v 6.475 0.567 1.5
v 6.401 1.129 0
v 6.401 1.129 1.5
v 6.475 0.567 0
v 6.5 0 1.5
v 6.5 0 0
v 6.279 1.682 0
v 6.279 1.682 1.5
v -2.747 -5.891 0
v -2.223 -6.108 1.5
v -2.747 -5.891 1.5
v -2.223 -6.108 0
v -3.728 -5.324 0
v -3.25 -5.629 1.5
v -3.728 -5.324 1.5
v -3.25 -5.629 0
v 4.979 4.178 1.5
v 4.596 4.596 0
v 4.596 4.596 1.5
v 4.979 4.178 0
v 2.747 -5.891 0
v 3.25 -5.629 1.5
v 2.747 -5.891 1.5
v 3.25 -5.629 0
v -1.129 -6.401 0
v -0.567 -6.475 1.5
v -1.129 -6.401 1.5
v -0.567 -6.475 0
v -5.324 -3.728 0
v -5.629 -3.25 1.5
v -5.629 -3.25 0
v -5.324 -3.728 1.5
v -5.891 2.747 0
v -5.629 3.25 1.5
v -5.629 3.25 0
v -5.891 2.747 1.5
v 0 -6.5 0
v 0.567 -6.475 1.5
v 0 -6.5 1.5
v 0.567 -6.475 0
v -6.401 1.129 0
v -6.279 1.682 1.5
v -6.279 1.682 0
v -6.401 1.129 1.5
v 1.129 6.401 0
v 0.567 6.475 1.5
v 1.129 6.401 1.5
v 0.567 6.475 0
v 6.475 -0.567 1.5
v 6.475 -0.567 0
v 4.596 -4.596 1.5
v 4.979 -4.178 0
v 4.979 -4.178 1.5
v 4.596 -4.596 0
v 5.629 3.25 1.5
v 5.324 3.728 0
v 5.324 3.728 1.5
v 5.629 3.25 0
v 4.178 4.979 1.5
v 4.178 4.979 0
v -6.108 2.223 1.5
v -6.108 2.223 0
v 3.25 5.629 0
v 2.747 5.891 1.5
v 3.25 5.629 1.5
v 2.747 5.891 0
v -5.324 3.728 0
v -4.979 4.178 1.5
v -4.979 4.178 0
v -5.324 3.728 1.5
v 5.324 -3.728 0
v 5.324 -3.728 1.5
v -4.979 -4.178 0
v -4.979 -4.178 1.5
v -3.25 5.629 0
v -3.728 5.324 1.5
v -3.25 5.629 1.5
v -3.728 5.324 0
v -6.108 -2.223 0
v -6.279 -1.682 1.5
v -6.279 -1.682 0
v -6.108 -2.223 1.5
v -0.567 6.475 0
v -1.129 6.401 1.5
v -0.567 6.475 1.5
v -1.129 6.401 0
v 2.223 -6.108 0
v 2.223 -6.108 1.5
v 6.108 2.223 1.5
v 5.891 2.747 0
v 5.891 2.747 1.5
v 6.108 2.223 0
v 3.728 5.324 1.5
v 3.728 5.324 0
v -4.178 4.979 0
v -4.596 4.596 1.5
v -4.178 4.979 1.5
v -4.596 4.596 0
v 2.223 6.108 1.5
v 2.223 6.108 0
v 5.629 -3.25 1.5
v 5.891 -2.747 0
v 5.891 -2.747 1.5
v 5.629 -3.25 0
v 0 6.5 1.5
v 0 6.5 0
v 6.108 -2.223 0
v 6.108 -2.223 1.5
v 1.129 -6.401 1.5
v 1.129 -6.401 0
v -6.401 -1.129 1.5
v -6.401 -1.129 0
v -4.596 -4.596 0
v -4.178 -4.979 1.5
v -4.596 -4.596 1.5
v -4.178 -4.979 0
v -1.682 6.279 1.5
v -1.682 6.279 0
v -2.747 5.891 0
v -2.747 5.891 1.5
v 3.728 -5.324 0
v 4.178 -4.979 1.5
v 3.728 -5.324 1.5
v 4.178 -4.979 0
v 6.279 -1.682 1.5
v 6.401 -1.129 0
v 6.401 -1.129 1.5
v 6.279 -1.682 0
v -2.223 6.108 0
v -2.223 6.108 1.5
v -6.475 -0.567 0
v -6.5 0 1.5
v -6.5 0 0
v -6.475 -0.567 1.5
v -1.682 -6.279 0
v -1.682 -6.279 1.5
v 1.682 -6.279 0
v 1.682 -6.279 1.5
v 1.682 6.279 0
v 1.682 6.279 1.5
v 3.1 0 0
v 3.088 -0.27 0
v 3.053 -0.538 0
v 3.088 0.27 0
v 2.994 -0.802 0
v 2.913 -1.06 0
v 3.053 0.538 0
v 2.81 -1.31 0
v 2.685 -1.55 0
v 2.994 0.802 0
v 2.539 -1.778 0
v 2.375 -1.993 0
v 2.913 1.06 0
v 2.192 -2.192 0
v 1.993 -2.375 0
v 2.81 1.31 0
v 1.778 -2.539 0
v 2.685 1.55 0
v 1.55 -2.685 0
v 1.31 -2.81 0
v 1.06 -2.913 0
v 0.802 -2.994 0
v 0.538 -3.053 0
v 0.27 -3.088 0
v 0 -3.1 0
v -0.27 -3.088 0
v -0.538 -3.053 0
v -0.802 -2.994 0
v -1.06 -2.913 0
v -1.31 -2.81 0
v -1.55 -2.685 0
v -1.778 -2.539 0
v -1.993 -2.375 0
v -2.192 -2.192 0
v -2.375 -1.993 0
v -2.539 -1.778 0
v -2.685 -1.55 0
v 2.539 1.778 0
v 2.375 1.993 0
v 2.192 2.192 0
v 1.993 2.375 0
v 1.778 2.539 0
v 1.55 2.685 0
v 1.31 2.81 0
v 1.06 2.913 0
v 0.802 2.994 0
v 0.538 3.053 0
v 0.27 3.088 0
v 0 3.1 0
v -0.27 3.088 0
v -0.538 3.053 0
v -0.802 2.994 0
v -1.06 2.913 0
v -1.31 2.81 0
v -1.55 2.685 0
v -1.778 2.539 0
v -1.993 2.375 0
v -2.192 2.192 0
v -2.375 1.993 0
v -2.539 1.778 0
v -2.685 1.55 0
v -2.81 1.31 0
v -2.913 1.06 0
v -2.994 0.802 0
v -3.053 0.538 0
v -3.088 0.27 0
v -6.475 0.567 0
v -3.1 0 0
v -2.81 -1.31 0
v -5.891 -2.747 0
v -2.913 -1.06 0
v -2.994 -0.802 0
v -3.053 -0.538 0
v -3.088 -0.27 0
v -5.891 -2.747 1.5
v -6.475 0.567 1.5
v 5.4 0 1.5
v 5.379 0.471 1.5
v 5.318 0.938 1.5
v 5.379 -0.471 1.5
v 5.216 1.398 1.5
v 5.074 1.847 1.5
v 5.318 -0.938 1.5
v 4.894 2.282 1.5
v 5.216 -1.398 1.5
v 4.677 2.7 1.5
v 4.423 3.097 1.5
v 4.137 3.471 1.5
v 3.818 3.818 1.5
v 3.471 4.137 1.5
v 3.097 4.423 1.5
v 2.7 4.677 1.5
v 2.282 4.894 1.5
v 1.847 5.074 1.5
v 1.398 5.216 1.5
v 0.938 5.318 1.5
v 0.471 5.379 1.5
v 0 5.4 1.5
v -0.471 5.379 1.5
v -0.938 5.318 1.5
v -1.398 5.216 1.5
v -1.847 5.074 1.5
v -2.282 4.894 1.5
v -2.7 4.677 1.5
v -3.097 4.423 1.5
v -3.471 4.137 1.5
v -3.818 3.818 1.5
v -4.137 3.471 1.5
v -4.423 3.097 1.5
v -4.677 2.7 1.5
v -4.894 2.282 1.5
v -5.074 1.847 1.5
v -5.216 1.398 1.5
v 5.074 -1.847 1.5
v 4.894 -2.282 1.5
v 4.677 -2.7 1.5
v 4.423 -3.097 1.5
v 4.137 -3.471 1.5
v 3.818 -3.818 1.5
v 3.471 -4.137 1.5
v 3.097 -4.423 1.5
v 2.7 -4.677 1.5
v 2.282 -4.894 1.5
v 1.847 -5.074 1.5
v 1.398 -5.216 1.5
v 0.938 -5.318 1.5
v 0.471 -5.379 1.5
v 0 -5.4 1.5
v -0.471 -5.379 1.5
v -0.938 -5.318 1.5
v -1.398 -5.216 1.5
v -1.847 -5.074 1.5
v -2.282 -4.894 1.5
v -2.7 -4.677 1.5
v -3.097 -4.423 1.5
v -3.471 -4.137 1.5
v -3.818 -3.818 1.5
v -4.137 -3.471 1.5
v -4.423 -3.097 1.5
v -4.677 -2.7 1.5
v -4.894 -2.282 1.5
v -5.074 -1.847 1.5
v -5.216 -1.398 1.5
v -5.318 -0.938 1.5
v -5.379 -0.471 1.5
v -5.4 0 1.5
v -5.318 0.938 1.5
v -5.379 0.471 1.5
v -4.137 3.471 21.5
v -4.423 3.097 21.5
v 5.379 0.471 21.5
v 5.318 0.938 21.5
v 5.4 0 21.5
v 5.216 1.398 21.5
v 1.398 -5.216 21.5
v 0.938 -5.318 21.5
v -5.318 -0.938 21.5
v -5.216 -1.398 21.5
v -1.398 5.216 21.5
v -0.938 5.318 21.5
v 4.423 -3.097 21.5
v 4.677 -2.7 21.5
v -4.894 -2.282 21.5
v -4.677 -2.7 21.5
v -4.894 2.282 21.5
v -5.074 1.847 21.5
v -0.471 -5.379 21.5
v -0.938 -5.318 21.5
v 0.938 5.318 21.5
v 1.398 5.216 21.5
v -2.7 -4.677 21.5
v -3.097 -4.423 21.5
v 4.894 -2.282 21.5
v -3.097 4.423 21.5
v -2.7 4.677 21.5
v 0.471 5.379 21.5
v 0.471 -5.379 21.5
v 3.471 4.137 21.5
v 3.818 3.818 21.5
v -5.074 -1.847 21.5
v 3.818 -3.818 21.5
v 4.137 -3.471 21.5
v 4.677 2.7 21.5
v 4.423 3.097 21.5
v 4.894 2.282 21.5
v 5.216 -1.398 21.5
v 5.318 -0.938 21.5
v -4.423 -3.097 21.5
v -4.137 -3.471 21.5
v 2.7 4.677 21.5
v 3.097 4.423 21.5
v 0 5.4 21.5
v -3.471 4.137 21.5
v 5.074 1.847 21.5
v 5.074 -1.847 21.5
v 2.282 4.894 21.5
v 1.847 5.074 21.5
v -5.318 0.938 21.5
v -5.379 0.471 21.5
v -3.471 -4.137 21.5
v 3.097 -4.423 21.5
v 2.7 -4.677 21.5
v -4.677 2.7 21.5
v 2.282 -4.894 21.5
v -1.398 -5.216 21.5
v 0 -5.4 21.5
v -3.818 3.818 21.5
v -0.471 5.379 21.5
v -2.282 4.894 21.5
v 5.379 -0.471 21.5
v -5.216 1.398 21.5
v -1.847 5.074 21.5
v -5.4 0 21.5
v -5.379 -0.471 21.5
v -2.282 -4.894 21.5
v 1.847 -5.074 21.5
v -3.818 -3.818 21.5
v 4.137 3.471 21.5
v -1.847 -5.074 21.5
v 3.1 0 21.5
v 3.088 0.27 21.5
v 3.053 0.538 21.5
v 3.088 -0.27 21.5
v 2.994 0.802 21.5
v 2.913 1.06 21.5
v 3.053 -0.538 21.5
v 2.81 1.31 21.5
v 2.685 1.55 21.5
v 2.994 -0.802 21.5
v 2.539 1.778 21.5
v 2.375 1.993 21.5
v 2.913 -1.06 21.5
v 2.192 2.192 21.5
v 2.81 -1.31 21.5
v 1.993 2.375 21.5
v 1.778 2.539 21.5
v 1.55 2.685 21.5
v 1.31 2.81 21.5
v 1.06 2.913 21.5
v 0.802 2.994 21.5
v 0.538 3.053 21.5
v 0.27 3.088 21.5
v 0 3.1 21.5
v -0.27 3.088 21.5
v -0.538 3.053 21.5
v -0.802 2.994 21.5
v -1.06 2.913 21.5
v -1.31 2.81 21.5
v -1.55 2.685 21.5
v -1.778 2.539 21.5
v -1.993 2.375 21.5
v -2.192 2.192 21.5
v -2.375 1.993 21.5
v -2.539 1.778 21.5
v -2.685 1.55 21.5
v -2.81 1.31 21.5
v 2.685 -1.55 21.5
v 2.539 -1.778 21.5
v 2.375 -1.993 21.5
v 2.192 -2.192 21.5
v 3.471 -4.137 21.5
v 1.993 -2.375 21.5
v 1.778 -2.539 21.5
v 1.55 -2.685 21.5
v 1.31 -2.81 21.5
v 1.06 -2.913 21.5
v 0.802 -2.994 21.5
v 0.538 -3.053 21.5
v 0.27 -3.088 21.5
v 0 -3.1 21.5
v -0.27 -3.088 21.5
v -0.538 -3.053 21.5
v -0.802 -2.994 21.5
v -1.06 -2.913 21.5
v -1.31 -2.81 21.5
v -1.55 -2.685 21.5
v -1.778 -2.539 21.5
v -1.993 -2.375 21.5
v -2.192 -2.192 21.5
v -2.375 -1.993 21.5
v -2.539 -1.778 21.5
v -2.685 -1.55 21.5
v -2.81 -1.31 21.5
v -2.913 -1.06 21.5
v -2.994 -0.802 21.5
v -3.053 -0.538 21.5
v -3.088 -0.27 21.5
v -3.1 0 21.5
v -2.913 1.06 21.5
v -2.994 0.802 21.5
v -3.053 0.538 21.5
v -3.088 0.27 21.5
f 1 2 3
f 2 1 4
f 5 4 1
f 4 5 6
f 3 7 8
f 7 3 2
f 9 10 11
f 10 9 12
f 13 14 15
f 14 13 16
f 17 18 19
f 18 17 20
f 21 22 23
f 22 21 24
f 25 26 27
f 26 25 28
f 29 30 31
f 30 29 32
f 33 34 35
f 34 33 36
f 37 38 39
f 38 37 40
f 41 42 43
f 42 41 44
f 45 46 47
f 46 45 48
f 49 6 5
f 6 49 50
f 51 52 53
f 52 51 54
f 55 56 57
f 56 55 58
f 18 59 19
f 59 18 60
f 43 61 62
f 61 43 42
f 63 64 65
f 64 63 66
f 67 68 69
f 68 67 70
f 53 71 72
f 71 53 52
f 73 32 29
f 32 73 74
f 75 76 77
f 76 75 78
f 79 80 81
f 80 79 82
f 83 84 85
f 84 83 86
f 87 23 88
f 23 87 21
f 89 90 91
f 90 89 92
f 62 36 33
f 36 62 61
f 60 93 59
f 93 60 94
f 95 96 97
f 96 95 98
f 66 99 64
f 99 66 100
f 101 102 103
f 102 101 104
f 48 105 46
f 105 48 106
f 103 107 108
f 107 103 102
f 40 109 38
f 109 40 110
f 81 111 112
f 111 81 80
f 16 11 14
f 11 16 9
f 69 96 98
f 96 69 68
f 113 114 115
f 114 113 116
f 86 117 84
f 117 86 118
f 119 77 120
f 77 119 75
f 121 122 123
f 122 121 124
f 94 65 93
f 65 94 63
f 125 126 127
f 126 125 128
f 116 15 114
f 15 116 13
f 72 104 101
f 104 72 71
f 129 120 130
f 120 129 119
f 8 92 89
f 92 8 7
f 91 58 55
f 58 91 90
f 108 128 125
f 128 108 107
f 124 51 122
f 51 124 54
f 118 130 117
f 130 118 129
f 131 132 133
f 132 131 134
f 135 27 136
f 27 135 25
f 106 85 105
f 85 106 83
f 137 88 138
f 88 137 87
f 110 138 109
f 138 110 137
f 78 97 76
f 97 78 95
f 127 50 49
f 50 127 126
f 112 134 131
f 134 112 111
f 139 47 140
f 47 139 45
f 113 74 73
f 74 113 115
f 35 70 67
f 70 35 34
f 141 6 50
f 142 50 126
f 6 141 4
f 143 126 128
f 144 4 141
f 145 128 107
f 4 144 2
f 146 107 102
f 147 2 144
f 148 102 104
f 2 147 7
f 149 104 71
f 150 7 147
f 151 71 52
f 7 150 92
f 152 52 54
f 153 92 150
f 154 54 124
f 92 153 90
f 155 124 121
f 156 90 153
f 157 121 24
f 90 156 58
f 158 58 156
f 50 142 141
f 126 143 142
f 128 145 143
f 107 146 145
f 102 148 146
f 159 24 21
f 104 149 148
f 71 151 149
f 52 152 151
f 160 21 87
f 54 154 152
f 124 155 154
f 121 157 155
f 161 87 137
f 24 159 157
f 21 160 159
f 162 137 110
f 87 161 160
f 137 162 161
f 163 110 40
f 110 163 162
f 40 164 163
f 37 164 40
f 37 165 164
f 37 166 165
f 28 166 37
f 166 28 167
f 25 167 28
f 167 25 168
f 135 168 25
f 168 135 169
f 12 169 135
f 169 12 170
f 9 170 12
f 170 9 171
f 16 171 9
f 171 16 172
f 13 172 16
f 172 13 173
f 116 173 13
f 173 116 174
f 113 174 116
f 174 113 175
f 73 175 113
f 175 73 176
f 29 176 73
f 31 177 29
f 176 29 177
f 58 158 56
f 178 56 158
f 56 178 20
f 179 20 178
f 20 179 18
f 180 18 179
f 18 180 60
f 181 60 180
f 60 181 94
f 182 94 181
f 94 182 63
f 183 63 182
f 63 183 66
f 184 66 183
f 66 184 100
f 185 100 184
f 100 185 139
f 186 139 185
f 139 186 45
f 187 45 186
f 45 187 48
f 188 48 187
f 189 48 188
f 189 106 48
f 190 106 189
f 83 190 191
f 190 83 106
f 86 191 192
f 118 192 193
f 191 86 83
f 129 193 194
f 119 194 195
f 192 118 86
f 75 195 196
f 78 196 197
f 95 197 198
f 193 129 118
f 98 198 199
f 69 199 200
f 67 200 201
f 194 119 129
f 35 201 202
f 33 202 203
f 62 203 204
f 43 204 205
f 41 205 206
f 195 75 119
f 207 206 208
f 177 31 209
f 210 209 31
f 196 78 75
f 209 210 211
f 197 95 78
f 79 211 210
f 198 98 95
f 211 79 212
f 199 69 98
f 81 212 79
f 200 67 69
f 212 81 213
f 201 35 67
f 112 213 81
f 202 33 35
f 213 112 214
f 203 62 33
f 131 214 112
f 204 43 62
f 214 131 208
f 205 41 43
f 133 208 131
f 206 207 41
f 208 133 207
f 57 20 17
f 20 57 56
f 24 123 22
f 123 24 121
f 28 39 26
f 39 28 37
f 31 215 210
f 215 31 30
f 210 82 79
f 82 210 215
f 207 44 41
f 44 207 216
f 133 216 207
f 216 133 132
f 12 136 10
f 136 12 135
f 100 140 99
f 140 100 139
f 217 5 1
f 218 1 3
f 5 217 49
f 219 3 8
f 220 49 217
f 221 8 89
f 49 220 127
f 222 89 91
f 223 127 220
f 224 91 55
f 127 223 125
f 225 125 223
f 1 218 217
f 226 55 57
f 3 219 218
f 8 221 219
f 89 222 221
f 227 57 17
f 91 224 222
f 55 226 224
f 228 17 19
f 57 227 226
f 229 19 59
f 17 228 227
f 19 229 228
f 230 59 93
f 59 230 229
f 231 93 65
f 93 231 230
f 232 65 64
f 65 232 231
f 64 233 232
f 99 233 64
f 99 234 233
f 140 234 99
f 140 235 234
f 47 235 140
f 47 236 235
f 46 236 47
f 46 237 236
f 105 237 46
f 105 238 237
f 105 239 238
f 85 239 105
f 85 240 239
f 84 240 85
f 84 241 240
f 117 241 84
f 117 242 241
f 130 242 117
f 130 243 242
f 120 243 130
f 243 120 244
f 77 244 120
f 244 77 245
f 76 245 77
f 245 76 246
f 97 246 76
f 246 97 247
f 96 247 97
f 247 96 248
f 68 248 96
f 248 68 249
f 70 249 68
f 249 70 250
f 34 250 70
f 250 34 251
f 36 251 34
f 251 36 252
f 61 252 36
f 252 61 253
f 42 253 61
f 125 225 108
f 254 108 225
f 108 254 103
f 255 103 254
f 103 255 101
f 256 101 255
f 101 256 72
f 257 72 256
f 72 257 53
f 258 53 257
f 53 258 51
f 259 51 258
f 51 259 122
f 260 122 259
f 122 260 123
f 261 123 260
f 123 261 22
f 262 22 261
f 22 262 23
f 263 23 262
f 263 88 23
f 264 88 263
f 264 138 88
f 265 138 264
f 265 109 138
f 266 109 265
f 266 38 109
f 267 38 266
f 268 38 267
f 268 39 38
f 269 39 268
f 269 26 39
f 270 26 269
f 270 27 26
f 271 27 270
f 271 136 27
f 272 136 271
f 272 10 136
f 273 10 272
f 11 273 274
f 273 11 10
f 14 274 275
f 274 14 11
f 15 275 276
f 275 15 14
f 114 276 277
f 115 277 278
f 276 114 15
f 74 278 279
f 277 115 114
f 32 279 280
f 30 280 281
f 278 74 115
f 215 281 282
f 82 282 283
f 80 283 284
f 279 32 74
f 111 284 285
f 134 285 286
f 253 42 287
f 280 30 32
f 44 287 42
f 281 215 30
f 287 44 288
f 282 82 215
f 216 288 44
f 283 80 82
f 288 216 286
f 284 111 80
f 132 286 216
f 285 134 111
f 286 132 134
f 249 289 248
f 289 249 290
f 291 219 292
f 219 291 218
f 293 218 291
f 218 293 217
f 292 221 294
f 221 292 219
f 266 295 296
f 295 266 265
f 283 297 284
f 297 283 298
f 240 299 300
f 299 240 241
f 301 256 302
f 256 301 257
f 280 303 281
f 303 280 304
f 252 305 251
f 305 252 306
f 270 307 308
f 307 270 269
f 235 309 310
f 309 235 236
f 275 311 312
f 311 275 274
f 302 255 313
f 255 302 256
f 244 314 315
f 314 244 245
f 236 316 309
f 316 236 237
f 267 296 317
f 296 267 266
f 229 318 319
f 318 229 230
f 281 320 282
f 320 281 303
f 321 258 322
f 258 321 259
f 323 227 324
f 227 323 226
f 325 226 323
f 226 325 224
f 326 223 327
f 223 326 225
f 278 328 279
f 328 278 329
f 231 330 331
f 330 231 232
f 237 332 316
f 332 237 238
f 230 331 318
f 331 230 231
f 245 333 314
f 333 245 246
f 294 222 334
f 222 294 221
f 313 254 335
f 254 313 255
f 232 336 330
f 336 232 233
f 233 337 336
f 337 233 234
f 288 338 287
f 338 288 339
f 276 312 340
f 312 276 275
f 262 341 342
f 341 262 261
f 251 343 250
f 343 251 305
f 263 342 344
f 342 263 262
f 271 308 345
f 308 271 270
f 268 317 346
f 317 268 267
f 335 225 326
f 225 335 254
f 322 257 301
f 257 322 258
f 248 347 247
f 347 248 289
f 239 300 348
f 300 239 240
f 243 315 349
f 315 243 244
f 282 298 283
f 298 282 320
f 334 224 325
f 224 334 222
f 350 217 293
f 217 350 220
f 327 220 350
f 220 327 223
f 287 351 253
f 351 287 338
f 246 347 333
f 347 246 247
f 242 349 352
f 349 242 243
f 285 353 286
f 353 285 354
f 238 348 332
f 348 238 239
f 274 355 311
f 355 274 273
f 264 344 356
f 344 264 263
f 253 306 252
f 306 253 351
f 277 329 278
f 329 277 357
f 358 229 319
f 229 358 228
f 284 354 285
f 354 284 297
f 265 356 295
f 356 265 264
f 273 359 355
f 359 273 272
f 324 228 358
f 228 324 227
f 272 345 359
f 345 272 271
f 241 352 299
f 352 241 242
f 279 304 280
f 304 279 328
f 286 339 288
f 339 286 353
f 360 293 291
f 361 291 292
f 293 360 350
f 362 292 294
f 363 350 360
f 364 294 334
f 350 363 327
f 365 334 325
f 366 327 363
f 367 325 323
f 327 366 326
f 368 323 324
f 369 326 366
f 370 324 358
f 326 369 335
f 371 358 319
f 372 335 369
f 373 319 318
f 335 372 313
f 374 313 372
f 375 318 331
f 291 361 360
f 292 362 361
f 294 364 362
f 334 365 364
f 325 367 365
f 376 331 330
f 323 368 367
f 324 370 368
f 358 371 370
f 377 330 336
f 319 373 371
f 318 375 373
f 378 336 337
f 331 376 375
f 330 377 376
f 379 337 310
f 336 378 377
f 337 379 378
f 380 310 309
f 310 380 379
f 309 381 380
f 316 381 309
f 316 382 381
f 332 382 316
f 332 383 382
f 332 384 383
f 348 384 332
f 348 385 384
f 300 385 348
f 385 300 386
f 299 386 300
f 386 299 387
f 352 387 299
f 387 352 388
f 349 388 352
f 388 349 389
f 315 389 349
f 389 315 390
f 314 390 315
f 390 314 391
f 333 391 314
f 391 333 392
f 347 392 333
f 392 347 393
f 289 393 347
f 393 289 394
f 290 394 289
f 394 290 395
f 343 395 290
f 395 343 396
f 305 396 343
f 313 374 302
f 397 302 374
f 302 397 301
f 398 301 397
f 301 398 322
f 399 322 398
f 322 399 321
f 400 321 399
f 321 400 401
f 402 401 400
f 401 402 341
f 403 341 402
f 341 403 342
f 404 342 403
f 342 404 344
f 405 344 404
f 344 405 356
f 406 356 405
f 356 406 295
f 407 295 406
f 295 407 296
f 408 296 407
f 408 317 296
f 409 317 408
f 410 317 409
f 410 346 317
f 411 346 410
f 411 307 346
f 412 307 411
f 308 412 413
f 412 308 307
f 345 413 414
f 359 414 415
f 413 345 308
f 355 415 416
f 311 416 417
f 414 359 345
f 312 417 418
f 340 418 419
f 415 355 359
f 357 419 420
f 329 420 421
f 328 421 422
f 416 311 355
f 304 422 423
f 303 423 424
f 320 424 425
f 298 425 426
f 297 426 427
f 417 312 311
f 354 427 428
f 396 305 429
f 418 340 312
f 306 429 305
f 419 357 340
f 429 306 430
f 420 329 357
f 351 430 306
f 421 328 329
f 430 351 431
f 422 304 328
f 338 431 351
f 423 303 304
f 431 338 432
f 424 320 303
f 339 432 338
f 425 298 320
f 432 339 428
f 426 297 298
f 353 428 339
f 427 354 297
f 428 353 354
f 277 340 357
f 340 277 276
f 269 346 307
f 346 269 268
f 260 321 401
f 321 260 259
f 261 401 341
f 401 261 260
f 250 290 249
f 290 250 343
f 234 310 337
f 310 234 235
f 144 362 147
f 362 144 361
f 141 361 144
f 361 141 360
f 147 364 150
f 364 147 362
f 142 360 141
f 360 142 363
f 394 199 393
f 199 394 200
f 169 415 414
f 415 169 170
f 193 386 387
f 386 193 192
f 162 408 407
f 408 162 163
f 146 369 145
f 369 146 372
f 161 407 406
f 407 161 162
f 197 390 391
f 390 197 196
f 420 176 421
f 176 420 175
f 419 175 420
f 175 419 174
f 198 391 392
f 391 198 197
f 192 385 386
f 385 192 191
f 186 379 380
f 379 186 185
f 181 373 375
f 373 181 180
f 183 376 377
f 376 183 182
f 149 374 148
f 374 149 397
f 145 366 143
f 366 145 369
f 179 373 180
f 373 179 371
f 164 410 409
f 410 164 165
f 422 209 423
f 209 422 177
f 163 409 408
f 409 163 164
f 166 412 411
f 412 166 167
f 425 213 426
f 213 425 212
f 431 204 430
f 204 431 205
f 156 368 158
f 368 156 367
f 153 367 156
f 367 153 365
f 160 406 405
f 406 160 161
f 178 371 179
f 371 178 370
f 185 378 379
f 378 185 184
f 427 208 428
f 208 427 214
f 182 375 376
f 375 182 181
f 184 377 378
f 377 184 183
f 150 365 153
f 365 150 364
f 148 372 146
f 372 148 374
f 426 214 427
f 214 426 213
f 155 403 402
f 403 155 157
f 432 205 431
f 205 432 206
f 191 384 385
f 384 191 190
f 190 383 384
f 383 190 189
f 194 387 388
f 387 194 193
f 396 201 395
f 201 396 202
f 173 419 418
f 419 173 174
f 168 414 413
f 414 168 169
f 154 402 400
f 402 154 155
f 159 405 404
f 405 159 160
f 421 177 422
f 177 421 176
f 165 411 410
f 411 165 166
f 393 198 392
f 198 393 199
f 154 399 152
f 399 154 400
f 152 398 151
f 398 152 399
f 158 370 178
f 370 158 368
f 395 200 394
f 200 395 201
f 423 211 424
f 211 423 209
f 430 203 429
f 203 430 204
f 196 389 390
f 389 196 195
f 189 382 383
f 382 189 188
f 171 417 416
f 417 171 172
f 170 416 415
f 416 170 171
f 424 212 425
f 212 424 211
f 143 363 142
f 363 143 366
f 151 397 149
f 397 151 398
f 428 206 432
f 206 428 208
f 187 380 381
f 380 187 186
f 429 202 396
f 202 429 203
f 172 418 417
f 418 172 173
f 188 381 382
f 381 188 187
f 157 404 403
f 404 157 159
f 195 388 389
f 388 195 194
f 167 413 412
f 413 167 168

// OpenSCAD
// Adapter sleeve - a collar with a sleeve body that lines a 1.5 mL tube rack hole to hold a
// 0.2 mL PCR tube. Printed upside down so the collar lies on the bed (z = 0) and the sleeve
// rises upward. A through-bore open at both ends.
//

collar_d  = 13;
collar_h  = 1.5;
body_d    = 10.8;
body_h    = 21.5;
bore      = 6.2;

$fn = 72;

collar_t = 1.5;

difference() {
    union() {
        cylinder(h = collar_h, d = collar_d);
        cylinder(h = body_h, d = body_d);
    }
    translate([0, 0, -1]) cylinder(h = body_h + 2, d = bore);
    translate([0, 0, body_h + 0.5]) cylinder(h = collar_t + 1, d = bore);
}
